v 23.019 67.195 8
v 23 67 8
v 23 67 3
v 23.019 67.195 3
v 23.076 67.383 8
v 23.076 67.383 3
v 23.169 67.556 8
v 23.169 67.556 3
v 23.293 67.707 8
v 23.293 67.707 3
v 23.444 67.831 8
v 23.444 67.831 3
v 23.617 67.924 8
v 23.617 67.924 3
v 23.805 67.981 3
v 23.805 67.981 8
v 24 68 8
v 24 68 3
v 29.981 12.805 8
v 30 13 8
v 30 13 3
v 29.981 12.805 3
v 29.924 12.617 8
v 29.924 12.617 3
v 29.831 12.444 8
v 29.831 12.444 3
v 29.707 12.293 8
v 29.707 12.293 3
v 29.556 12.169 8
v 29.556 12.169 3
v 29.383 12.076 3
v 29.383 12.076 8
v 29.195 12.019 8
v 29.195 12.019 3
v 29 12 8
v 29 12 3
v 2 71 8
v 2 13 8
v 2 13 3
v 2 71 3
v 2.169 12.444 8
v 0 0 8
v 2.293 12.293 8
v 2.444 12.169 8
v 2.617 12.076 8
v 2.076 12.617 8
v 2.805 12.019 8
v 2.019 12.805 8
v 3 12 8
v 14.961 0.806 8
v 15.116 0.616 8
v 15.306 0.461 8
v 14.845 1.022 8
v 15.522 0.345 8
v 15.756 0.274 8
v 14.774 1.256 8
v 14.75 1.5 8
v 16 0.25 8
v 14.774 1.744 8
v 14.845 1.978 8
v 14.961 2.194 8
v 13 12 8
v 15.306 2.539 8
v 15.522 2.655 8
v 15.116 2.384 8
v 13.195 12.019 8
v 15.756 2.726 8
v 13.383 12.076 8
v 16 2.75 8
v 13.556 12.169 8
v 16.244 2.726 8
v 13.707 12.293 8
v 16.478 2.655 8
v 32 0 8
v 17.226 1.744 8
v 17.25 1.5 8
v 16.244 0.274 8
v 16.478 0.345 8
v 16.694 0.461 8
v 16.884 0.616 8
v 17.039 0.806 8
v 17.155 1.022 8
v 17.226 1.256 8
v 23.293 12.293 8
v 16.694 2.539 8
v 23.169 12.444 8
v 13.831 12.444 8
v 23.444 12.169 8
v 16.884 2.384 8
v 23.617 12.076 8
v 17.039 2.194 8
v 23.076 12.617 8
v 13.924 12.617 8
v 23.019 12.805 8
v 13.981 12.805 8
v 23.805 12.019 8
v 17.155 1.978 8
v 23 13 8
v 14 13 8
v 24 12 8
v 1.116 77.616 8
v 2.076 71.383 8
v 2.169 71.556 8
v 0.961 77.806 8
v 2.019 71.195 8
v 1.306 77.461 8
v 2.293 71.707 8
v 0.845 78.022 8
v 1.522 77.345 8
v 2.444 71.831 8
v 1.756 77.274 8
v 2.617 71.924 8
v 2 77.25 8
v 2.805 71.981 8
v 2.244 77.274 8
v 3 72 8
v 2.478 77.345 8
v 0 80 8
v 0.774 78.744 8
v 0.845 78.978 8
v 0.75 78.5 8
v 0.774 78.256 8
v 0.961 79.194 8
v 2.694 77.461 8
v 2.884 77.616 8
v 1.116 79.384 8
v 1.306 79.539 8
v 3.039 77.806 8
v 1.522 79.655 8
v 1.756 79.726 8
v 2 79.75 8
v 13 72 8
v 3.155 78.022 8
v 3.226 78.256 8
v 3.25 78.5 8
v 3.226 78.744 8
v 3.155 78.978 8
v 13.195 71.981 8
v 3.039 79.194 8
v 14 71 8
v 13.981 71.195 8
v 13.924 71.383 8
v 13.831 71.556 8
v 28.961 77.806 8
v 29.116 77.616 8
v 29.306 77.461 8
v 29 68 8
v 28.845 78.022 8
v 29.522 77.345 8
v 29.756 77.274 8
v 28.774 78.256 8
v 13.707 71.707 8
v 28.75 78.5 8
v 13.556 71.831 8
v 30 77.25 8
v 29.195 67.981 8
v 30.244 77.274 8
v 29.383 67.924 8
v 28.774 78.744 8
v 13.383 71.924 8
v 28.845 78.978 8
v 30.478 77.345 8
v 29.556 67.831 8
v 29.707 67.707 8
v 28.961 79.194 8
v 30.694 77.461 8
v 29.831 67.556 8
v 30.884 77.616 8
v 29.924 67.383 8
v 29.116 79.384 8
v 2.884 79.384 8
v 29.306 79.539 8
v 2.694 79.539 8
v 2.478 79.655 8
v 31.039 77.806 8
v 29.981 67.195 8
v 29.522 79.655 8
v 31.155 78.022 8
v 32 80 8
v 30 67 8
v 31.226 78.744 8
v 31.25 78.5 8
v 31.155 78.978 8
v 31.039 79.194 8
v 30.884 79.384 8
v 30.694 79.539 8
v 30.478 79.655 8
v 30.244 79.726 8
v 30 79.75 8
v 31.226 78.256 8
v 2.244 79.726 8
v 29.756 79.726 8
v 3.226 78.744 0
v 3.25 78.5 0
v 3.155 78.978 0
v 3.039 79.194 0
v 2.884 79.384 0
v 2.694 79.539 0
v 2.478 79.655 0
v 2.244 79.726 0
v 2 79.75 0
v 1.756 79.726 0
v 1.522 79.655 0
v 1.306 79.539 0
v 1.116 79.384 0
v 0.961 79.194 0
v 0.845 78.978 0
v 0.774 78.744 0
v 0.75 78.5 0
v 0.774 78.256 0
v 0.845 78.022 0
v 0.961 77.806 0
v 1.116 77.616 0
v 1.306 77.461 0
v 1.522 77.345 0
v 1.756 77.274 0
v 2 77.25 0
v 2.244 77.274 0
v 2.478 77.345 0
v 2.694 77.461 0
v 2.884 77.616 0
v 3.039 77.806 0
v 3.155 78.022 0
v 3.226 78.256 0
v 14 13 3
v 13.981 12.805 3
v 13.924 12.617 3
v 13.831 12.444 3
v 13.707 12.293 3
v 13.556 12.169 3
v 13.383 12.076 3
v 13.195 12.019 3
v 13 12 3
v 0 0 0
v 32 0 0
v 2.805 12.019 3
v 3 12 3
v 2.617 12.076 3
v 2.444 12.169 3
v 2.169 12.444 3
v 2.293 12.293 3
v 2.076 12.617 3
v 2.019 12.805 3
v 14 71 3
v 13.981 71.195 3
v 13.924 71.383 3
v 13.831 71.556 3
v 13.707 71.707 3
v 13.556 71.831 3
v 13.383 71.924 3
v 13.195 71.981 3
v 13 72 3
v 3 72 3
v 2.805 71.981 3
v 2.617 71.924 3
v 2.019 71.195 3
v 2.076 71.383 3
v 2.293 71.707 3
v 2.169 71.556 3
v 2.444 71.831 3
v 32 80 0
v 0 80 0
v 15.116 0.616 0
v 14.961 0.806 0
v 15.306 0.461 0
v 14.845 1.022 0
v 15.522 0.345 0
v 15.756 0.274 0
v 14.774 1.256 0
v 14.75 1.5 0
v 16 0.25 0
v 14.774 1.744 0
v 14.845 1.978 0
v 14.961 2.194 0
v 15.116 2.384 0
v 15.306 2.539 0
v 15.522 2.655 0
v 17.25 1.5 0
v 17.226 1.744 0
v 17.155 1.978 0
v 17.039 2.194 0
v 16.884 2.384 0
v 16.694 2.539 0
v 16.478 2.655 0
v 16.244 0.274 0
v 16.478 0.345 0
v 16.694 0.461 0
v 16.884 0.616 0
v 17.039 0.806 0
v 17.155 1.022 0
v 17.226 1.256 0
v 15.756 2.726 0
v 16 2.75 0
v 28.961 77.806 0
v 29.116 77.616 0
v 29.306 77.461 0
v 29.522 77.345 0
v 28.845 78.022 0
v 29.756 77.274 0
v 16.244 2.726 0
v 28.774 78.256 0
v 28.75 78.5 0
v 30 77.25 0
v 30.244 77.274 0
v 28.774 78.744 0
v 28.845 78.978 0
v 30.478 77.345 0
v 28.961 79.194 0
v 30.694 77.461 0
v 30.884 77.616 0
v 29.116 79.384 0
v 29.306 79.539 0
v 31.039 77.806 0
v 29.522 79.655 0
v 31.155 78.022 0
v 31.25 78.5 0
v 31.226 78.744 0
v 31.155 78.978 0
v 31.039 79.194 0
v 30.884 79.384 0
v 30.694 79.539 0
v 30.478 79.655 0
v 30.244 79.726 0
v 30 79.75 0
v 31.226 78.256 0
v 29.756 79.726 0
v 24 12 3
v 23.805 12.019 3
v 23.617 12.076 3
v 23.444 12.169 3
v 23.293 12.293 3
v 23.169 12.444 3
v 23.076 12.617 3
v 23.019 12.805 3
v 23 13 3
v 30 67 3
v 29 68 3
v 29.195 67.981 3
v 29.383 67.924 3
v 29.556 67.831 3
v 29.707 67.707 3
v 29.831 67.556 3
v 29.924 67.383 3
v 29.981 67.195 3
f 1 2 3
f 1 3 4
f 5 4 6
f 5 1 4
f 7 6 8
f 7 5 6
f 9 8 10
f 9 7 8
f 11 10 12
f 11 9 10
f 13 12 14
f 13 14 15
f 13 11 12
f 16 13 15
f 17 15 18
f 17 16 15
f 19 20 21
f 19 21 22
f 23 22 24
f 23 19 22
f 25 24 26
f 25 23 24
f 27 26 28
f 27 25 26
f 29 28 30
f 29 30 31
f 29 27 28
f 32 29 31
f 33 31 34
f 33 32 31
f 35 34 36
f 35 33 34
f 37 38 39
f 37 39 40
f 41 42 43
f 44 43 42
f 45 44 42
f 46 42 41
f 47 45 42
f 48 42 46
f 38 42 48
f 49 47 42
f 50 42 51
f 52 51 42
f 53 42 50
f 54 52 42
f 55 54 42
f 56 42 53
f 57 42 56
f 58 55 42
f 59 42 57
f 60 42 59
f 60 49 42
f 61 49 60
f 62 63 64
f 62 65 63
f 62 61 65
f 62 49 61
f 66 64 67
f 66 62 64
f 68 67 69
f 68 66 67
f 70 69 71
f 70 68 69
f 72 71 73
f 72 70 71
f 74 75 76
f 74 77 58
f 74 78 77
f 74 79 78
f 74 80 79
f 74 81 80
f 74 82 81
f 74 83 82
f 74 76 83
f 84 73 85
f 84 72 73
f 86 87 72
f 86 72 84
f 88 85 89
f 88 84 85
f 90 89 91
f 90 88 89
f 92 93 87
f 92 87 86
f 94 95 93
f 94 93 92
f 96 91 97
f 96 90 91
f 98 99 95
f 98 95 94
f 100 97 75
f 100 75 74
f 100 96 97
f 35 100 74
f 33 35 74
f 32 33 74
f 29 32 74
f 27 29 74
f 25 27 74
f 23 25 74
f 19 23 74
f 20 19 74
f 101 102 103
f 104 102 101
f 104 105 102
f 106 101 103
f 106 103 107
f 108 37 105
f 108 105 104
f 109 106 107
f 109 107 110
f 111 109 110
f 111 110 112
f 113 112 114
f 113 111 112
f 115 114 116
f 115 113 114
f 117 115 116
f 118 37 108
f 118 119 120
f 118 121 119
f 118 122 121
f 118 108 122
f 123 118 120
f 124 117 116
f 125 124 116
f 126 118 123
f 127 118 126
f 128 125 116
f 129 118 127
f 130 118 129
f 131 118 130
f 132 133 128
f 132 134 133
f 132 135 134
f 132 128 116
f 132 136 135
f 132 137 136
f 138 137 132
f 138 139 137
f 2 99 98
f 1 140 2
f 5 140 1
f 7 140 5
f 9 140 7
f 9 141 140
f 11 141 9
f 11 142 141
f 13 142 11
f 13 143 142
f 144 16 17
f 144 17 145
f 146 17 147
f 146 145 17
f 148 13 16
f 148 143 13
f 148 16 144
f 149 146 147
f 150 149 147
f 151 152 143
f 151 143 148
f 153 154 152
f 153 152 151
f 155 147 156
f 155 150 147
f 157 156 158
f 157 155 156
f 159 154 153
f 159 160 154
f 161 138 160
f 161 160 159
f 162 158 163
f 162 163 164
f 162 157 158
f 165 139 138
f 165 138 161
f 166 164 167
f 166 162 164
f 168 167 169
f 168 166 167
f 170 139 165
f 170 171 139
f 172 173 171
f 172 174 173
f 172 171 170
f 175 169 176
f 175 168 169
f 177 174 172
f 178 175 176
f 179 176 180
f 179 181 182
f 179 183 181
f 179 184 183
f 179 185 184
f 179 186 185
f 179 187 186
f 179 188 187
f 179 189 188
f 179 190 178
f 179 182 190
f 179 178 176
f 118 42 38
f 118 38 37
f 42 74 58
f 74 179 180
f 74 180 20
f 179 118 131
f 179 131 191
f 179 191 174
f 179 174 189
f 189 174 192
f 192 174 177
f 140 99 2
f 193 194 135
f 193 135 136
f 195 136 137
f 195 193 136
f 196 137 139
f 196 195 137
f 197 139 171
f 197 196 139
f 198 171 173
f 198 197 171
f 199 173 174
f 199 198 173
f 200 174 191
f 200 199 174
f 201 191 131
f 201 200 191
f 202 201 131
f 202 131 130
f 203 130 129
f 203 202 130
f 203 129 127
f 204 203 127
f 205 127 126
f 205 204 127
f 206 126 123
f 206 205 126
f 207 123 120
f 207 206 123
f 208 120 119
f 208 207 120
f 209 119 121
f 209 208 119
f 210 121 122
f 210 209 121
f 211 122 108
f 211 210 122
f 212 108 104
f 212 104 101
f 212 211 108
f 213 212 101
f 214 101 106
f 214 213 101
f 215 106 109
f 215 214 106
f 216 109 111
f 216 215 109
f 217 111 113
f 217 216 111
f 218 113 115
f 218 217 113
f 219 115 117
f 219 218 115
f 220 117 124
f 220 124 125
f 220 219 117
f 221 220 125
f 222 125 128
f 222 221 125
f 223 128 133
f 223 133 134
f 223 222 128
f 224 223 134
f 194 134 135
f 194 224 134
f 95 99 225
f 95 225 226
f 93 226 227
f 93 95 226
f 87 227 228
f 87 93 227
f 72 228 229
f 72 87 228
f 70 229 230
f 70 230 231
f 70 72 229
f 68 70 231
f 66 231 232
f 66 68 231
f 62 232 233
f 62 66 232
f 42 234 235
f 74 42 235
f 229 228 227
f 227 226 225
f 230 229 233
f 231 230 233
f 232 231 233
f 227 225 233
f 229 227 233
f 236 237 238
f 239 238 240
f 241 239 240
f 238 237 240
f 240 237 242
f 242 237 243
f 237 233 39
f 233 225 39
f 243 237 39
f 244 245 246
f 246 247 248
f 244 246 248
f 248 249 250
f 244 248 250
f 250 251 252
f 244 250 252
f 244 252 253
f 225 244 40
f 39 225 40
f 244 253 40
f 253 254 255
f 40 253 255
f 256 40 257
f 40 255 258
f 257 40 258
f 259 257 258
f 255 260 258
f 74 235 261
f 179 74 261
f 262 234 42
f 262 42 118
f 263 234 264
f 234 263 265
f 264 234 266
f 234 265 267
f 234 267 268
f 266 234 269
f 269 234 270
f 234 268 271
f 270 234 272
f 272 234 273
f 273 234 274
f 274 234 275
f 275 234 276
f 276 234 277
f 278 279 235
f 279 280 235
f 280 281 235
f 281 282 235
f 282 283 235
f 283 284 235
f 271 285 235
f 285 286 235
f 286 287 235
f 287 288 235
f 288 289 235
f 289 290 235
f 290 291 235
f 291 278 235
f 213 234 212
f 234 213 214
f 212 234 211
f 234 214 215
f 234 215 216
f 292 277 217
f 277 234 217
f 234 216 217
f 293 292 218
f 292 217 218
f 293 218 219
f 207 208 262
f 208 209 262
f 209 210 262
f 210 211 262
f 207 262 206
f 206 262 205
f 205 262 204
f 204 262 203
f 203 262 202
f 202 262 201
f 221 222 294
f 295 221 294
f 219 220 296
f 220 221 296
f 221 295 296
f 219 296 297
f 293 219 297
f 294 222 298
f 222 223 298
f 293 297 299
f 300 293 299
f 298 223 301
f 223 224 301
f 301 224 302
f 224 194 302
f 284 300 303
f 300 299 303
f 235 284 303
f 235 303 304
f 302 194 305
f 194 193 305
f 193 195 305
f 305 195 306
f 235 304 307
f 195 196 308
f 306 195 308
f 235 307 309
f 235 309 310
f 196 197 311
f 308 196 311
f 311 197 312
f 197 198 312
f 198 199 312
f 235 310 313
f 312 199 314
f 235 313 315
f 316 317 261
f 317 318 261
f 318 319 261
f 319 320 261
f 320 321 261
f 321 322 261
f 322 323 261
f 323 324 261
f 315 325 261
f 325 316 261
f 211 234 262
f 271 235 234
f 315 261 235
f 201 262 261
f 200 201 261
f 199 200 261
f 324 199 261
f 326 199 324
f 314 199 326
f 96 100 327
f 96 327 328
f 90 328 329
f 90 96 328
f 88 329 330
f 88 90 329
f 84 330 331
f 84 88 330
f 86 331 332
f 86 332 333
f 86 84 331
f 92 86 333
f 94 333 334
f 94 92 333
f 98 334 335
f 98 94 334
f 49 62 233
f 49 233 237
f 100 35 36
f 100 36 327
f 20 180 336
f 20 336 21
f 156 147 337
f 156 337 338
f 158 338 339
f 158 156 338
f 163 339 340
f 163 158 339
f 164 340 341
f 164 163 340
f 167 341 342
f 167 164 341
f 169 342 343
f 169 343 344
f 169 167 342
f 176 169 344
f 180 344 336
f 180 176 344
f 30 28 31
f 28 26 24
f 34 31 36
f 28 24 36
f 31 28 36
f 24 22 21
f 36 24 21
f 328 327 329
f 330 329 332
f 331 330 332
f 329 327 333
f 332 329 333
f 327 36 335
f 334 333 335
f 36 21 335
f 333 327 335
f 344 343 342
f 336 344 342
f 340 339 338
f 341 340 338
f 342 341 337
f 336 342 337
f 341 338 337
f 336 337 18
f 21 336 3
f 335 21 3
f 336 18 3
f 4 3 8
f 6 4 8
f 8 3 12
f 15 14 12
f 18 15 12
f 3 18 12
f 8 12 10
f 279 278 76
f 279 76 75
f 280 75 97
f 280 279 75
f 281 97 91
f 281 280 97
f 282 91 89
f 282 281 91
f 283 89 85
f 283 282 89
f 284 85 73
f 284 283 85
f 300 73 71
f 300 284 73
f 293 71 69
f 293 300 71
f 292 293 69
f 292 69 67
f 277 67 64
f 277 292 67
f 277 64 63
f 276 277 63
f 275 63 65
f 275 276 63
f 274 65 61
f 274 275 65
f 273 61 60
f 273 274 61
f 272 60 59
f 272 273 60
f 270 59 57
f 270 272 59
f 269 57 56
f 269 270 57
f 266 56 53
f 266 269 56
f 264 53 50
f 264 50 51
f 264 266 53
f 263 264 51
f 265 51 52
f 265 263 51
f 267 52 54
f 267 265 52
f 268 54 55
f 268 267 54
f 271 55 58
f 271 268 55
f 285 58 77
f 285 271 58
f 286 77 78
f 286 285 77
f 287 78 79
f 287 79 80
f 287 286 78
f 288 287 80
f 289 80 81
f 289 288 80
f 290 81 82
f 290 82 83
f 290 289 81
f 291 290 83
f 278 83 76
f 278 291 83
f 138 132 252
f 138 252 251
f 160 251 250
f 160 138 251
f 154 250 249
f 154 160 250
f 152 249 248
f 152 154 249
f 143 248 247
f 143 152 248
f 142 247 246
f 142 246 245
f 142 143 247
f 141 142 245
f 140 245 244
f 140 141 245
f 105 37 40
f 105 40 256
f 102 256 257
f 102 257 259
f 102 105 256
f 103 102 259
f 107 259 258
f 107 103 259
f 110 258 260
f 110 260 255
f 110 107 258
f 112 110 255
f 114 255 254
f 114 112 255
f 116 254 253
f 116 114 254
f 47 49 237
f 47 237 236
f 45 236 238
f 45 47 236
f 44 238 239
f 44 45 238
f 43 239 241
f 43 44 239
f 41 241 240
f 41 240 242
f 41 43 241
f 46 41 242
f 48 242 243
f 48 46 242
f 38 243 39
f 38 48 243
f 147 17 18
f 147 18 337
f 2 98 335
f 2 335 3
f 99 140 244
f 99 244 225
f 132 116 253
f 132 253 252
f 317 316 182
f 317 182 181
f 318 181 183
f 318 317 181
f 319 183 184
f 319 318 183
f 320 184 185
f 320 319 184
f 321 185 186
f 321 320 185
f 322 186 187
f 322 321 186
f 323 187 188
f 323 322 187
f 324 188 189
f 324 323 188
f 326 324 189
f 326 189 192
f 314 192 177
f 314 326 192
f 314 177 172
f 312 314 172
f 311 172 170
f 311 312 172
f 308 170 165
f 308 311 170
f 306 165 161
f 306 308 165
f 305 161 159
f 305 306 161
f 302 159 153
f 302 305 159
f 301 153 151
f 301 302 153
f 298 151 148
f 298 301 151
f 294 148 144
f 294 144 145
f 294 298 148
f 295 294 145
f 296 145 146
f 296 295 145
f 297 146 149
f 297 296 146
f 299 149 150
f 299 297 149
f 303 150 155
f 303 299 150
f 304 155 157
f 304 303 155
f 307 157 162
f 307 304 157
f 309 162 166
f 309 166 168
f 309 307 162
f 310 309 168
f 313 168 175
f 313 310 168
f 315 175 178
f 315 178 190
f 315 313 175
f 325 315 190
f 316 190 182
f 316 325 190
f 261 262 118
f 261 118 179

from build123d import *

# Parameters (mm, degrees)
ESQUISSE1_W             = 32
ESQUISSE1_H             = 80
ESQUISSE1_R             = 1.25
BOSS_EXTRU_2_DEPTH      = 8
ENL_V_MAT_EXTRU_1_DEPTH = 5


with BuildPart() as part:
    # Esquisse1 → Boss.-Extru.2 (new body)
    with BuildSketch(Plane.XY):
        with Locations((16, 40)):
            Rectangle(ESQUISSE1_W, ESQUISSE1_H)
        with Locations((2, 78.5)):
            Circle(ESQUISSE1_R, mode=Mode.SUBTRACT)
        with Locations((30, 78.5)):
            Circle(ESQUISSE1_R, mode=Mode.SUBTRACT)
        with Locations((16, 1.5)):
            Circle(ESQUISSE1_R, mode=Mode.SUBTRACT)
    extrude(amount=BOSS_EXTRU_2_DEPTH)

    # Esquisse2 → Enlèv. mat.-Extru.1 (cut)
    with BuildSketch(Plane.XY.offset(8)):
        with BuildLine():
            Line((24, 68), (29, 68))
            ThreePointArc((29, 68), (29.707106781, 67.707106781), (30, 67))
            Line((30, 67), (30, 13))
            ThreePointArc((30, 13), (29.707106781, 12.292893219), (29, 12))
            Line((29, 12), (24, 12))
            ThreePointArc((24, 12), (23.292893219, 12.292893219), (23, 13))
            Line((23, 13), (23, 67))
            ThreePointArc((23, 67), (23.292893219, 67.707106781), (24, 68))
        make_face()
        with BuildLine():
            Line((3, 72), (13, 72))
            ThreePointArc((13, 72), (13.707106781, 71.707106781), (14, 71))
            Line((14, 71), (14, 13))
            ThreePointArc((14, 13), (13.707106781, 12.292893219), (13, 12))
            Line((13, 12), (3, 12))
            ThreePointArc((3, 12), (2.292893219, 12.292893219), (2, 13))
            Line((2, 13), (2, 71))
            ThreePointArc((2, 71), (2.292893219, 71.707106781), (3, 72))
        make_face()
    extrude(amount=-ENL_V_MAT_EXTRU_1_DEPTH, mode=Mode.SUBTRACT)


solid = part.part
